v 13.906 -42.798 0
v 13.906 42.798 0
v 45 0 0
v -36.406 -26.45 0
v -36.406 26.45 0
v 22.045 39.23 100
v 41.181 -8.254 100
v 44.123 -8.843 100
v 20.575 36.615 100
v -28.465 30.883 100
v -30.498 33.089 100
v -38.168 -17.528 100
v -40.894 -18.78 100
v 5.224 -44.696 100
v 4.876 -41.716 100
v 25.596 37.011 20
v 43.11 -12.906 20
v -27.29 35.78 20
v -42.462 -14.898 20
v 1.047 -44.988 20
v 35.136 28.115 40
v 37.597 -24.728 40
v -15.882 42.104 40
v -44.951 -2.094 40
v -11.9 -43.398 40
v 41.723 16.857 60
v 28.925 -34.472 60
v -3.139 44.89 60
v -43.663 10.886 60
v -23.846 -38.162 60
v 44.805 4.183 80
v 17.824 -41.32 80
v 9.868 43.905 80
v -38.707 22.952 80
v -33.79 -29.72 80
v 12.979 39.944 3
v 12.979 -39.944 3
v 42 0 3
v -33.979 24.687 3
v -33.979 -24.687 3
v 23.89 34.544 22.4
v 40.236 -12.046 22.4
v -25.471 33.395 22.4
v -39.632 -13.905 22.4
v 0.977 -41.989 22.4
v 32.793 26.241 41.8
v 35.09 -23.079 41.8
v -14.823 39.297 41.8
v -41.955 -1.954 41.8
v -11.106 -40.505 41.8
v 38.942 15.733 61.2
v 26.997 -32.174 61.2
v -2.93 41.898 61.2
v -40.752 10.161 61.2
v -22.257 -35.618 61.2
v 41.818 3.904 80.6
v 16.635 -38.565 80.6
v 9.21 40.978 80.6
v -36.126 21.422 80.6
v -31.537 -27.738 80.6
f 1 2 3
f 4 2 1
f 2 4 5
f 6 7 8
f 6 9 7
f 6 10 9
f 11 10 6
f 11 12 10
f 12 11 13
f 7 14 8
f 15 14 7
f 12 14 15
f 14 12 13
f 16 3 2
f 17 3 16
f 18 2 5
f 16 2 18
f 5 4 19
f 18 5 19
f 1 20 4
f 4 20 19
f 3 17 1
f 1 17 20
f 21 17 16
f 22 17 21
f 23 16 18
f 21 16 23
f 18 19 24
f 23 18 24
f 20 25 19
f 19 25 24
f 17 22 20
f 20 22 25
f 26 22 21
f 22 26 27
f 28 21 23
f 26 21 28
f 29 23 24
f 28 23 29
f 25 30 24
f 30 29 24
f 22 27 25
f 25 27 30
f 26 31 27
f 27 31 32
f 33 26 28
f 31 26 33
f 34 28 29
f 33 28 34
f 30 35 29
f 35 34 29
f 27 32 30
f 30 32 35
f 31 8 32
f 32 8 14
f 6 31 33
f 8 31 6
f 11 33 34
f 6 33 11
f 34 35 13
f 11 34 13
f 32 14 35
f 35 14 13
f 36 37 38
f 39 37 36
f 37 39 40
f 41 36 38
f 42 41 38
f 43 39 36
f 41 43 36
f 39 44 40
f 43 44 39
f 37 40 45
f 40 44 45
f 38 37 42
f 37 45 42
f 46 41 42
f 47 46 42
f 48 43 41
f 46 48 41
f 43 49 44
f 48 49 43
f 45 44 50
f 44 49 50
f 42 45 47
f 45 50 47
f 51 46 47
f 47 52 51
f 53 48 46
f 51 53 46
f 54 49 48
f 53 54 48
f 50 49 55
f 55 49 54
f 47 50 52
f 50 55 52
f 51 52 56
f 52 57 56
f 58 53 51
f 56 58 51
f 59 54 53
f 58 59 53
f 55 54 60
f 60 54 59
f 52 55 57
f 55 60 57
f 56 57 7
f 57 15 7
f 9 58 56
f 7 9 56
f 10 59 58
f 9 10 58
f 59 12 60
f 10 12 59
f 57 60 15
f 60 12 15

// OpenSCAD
radius = 45;
wall = 3;
height = 100;
twist = 5*height/6;

difference(){
	linear_extrude(height = height, center = false, convexity = 0, twist = twist, slices=height/20)
		circle(r = radius, $fn=5);
	translate([0,0,wall])
		linear_extrude(height=height-wall, center=false, convexity=0, twist=twist, slices=height/20)
			circle(r = radius-wall, $fn=5);
}
